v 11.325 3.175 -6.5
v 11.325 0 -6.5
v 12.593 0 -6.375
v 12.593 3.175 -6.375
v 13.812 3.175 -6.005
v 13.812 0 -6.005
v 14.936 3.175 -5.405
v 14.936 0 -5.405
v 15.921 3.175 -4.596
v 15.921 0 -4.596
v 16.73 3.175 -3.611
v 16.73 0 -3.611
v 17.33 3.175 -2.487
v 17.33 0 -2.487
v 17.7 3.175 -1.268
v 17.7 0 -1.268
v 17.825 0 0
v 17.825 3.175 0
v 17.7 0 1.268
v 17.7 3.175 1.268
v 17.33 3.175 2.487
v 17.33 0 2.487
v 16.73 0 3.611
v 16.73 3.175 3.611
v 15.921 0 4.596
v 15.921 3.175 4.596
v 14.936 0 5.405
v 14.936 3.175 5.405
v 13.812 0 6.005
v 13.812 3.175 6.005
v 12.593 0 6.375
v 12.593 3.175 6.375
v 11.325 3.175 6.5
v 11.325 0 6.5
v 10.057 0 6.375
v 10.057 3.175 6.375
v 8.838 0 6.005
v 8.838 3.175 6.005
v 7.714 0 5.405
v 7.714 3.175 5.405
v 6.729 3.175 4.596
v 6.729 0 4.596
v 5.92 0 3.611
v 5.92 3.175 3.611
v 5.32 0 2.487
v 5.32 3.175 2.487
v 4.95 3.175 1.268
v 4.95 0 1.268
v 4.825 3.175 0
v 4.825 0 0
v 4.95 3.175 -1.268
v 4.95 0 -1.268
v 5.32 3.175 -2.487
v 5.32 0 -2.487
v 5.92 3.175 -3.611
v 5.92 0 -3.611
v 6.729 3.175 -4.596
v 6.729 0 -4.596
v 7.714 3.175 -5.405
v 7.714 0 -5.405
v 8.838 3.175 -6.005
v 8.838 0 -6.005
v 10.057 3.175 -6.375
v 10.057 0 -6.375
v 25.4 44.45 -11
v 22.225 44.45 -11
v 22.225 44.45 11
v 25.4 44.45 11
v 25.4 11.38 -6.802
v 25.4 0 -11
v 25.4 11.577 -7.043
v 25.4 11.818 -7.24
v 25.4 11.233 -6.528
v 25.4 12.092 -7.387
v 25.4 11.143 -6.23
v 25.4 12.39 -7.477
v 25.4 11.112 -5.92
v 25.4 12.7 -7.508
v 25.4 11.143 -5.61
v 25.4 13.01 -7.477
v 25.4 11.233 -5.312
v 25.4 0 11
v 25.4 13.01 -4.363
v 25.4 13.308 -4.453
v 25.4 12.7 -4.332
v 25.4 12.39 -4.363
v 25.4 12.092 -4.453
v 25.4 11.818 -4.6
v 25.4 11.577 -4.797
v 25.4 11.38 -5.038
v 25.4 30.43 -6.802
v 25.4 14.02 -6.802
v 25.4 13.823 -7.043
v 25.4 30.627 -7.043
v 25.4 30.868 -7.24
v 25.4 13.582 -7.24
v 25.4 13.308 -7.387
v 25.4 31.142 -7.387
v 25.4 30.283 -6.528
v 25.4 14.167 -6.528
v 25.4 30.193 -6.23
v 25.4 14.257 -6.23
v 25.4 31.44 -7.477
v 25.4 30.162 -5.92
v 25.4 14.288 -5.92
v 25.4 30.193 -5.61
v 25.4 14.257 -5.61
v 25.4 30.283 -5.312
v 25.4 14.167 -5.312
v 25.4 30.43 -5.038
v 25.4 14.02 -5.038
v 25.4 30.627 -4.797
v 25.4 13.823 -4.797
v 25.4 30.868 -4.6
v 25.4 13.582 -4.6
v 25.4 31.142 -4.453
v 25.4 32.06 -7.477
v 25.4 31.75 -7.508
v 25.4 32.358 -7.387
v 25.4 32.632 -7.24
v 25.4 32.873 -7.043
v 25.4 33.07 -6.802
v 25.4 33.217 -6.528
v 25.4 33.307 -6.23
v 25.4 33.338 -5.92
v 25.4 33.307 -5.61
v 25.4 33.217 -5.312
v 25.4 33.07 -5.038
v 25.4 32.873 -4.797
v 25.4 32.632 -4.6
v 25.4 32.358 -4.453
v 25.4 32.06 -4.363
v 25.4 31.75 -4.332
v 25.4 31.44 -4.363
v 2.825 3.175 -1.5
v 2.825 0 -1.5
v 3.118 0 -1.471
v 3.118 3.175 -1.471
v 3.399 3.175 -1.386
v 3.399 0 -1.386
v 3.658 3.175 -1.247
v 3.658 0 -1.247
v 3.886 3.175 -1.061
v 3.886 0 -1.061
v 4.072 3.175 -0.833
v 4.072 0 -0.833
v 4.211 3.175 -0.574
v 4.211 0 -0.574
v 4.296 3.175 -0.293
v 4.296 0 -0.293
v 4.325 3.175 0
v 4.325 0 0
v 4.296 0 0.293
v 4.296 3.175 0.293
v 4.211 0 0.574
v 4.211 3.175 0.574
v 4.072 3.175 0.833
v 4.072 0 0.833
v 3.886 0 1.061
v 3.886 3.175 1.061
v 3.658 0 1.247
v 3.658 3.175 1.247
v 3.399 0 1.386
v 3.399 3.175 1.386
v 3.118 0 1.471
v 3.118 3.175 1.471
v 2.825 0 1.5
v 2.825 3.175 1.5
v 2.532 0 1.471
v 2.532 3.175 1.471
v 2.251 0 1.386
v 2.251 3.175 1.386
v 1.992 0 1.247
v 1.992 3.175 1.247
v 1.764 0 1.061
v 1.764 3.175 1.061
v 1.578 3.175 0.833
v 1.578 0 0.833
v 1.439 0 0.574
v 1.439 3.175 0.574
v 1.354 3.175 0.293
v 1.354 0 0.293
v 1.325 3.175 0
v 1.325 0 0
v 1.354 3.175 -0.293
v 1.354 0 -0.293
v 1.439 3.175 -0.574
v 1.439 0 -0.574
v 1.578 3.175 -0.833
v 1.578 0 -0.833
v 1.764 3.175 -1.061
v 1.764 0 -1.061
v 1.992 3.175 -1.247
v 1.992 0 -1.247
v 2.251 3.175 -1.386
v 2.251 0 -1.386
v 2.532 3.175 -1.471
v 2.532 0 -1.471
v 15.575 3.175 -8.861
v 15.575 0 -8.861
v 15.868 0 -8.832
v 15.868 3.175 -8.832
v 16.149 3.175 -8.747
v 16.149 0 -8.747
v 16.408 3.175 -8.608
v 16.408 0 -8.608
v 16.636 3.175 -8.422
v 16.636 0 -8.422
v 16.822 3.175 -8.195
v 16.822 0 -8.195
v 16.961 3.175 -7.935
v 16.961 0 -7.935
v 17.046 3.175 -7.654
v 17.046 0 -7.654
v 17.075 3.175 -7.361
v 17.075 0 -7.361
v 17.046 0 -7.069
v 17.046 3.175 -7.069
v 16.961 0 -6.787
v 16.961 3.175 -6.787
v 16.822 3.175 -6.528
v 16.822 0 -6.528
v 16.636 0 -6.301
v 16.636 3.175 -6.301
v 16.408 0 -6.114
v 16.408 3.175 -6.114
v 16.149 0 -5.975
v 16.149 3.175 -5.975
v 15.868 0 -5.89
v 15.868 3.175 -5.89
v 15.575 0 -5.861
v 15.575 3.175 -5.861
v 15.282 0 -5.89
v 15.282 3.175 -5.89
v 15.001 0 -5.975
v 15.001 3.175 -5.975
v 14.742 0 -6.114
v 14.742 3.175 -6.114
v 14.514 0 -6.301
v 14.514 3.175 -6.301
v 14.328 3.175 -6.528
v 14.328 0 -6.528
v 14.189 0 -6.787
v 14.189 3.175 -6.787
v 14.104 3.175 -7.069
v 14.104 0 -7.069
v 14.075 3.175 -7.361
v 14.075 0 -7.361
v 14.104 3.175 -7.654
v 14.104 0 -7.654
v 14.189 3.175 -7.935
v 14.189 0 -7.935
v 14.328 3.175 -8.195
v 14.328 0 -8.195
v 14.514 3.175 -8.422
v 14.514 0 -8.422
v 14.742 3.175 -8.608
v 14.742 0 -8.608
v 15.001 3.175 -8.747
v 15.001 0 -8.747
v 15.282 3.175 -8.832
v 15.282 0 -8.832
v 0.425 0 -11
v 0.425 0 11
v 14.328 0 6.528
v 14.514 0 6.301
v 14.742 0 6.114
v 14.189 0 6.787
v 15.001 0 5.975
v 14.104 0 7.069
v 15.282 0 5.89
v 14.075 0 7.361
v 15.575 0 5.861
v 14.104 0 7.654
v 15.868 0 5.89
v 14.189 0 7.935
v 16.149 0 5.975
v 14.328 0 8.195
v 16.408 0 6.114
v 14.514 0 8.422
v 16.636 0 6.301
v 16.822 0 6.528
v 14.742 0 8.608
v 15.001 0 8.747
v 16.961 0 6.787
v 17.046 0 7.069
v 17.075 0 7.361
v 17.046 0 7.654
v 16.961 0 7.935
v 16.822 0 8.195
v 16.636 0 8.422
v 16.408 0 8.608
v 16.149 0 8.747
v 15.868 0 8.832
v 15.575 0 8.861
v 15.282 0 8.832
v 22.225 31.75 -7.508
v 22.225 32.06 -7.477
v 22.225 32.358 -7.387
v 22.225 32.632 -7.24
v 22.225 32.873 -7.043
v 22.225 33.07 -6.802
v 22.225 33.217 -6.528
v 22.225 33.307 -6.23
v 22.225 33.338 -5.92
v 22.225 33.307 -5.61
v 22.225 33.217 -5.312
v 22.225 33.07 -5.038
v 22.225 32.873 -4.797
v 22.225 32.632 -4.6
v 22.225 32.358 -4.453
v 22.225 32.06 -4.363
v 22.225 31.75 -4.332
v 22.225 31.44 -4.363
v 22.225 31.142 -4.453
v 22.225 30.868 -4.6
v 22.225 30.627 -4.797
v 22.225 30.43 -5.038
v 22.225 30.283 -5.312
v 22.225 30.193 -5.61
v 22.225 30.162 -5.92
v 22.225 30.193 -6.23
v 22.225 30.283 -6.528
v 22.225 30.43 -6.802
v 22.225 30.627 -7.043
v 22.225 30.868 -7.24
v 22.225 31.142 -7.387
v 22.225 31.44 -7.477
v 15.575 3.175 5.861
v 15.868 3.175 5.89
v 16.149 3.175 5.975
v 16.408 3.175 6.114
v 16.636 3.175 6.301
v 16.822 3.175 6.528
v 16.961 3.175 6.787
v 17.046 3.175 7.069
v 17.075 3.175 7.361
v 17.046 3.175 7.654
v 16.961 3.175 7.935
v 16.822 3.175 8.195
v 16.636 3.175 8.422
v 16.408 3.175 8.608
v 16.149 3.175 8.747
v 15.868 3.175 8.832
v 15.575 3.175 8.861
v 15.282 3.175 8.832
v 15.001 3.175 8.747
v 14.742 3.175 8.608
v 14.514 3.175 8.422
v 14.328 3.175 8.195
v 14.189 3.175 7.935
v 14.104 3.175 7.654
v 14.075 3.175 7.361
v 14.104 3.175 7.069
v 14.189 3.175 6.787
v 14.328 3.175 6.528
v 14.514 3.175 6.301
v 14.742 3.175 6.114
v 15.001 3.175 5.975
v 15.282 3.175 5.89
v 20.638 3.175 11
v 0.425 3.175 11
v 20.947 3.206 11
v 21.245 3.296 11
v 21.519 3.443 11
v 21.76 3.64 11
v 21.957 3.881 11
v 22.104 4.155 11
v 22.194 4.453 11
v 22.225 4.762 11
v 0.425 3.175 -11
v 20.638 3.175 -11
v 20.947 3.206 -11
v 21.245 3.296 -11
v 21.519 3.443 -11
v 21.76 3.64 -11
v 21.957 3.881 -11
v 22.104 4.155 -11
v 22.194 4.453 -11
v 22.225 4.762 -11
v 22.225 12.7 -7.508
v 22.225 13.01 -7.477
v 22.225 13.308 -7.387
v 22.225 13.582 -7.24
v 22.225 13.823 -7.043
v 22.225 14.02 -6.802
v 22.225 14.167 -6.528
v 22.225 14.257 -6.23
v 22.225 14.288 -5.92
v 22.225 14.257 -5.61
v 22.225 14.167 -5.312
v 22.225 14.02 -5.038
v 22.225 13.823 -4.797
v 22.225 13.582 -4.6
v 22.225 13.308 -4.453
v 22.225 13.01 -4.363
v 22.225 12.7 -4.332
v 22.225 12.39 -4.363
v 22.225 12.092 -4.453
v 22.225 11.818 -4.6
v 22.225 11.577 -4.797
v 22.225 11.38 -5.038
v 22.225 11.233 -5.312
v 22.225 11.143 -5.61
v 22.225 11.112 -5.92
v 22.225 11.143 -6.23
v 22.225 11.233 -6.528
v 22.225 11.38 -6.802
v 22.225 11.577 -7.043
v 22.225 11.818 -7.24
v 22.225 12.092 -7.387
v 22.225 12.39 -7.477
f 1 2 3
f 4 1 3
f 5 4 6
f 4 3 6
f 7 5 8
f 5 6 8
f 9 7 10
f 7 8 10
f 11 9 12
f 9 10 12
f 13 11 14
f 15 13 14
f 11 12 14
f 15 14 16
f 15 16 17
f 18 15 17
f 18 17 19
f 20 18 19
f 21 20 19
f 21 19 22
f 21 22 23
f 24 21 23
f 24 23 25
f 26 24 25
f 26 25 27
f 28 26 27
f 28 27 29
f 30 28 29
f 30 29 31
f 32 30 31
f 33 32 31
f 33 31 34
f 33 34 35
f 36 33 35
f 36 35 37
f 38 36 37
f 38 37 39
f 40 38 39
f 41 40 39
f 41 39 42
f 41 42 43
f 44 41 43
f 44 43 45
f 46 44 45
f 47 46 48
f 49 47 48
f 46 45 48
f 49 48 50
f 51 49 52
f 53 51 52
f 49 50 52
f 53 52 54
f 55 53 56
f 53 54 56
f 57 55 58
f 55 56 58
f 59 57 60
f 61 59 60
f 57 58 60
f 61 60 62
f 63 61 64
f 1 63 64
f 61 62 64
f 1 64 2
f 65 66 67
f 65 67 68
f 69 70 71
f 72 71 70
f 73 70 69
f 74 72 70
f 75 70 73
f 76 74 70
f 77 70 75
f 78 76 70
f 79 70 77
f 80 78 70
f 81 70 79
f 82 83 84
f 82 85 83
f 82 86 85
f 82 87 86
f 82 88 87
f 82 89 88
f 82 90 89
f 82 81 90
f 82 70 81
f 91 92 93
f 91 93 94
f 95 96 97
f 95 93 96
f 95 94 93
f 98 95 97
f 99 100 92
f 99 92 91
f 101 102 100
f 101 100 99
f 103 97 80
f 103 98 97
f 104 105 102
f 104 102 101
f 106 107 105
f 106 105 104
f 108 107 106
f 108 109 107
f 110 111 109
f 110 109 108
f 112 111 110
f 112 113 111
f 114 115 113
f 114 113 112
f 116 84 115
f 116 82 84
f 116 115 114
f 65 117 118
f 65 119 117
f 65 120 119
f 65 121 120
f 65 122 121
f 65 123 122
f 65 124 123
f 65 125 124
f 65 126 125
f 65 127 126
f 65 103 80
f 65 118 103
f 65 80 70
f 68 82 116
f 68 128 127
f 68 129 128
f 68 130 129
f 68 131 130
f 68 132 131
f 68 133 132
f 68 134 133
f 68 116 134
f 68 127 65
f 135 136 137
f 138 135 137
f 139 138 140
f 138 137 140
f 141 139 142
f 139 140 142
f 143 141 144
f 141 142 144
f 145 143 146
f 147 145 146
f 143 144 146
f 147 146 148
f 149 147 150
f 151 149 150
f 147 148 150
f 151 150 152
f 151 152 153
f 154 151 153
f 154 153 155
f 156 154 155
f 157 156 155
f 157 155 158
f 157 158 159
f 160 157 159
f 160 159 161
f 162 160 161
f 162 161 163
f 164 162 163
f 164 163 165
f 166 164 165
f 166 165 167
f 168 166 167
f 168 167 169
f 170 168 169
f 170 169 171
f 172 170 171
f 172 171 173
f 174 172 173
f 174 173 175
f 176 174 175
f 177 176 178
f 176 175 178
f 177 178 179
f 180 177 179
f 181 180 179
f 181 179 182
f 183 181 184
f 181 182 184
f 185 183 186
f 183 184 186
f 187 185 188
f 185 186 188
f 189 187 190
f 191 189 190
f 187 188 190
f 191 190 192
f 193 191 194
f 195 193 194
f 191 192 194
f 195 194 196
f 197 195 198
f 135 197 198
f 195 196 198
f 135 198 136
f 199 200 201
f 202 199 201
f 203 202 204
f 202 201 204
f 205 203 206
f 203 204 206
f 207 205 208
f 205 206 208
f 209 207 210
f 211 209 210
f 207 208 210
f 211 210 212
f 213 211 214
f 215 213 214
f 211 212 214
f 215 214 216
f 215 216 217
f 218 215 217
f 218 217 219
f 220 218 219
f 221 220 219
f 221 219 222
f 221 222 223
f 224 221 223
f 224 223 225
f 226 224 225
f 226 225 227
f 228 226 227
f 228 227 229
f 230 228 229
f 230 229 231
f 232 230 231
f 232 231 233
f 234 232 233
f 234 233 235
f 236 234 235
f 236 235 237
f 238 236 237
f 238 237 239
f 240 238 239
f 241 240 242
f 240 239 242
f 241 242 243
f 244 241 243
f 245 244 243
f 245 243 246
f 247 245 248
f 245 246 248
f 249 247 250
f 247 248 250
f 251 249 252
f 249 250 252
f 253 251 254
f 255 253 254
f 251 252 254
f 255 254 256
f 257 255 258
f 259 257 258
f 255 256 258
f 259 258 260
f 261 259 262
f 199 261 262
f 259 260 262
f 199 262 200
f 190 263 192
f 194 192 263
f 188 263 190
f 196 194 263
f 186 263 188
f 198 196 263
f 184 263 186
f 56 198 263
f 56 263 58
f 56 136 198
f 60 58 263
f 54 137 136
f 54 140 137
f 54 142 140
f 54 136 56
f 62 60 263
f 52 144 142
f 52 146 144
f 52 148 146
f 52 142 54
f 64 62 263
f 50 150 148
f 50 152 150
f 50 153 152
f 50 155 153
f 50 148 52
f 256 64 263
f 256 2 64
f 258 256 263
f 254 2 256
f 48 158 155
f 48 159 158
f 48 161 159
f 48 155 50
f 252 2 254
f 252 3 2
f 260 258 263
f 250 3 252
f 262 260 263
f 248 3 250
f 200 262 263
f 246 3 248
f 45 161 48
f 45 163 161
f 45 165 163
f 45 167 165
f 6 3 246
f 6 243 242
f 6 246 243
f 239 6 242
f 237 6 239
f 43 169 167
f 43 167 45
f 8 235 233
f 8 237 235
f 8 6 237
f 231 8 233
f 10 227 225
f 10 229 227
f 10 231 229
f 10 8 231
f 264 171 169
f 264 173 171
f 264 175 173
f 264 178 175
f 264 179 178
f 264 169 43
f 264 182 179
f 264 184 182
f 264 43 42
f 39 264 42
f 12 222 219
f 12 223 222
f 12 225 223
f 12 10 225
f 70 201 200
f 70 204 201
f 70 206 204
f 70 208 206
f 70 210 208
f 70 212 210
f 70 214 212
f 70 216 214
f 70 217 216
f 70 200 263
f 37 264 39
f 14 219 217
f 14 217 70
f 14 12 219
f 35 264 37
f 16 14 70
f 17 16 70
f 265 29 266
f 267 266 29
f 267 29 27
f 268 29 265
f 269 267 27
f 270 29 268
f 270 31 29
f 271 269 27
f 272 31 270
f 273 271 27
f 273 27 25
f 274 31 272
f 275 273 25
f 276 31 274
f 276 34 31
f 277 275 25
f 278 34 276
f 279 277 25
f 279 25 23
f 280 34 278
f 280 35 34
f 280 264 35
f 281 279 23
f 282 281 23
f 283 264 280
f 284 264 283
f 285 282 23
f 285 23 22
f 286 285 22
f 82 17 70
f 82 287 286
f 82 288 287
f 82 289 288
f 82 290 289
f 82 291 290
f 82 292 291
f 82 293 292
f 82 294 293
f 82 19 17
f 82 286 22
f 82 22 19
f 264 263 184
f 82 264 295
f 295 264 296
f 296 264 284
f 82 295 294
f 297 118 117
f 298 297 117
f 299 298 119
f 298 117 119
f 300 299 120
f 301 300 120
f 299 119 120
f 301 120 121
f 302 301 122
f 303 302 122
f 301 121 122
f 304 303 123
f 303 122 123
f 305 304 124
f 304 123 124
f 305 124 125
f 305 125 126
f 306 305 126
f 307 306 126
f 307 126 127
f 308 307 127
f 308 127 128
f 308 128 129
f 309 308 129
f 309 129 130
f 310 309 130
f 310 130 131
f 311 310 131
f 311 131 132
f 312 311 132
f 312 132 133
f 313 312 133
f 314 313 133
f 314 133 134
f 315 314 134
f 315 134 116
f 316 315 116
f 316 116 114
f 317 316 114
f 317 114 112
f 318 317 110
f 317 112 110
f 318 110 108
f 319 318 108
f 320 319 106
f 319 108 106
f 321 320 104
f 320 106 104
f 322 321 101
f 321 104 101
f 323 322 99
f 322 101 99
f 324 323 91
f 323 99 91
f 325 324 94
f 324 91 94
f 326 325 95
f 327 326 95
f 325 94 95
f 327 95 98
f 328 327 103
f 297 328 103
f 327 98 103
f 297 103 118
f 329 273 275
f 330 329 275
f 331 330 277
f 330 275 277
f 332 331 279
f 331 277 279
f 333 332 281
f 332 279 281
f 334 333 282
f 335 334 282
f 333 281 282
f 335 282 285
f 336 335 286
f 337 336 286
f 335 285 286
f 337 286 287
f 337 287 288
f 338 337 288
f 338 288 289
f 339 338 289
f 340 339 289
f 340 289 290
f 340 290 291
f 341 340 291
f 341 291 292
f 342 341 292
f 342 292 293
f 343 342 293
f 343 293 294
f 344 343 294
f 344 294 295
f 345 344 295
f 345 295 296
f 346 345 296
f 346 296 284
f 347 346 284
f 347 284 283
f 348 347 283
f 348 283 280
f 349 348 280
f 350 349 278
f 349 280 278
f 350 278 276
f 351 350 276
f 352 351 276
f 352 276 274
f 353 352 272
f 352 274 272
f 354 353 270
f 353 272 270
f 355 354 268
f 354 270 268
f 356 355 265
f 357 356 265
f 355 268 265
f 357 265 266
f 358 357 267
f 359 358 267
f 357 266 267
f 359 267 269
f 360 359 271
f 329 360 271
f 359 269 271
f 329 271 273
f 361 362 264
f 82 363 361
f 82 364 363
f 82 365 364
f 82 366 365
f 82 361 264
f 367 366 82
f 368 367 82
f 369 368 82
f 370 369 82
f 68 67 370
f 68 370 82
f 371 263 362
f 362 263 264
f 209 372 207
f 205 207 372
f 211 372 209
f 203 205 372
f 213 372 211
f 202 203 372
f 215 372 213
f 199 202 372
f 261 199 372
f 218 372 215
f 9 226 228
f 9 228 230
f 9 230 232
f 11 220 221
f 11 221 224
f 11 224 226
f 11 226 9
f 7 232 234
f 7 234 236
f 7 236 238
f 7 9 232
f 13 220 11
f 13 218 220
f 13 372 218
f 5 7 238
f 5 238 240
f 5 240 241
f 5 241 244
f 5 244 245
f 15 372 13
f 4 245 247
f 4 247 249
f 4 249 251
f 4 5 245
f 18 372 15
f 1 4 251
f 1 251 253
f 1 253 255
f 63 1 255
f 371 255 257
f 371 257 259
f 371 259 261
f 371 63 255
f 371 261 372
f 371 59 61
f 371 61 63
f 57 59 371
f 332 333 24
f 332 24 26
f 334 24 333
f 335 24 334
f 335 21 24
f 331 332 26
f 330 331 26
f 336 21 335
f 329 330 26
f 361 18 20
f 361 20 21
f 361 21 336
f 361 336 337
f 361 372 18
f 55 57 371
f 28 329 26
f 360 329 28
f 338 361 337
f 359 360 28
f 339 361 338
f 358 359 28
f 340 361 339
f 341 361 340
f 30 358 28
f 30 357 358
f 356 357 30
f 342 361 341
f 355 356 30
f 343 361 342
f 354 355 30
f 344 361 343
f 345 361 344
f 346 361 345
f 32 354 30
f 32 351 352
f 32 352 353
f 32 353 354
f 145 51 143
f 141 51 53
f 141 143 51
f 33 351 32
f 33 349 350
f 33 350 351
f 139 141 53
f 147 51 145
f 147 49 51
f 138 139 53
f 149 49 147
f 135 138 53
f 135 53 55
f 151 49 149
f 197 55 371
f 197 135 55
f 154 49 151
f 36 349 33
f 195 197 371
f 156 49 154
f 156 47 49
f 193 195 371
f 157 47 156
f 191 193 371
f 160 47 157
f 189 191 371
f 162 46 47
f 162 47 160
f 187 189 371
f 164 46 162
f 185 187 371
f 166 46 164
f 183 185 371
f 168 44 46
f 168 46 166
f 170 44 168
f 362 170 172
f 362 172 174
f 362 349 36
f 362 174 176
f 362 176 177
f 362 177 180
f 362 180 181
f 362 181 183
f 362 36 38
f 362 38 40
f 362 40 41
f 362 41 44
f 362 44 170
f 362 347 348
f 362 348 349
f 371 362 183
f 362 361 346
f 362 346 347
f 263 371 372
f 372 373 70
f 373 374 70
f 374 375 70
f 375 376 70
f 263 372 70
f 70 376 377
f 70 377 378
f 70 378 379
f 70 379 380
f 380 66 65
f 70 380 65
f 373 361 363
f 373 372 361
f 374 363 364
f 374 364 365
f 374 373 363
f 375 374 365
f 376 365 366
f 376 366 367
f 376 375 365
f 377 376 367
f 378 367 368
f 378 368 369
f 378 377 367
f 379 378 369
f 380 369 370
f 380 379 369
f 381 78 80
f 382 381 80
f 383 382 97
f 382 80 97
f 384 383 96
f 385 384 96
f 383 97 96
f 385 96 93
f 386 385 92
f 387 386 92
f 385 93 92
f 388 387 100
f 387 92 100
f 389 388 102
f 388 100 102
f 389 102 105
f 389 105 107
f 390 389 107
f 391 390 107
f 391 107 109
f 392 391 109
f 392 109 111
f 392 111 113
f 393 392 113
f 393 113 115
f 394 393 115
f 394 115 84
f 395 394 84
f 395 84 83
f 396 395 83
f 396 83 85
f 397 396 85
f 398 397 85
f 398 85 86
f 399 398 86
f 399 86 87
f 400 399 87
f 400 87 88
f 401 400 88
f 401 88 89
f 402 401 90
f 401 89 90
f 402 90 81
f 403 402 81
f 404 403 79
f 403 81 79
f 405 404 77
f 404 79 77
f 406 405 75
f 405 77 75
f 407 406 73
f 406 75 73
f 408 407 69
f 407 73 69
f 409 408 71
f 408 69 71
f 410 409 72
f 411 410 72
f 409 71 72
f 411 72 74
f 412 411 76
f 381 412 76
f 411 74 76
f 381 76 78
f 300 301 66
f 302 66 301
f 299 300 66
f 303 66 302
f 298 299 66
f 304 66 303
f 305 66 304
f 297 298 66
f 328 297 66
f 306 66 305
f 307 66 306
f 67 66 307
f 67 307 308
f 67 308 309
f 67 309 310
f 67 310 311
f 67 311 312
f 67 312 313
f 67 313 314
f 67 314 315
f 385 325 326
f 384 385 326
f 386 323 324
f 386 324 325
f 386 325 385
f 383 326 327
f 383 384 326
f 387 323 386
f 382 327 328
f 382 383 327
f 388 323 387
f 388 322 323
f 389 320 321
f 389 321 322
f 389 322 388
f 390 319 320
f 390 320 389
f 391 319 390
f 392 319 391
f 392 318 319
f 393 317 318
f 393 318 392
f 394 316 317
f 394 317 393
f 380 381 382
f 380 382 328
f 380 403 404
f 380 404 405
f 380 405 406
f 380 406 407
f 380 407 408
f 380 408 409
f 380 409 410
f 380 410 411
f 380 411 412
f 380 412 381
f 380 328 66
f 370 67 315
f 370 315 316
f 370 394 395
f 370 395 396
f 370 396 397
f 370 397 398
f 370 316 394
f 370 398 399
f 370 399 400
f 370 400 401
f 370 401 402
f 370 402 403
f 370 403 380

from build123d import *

# Parameters (mm, degrees)
BOSS_EXTRUDE1_DEPTH = 11
FILLET1_R           = 1.5875
SKETCH3_W           = 24.423912887
SKETCH3_H           = 26.552361768
CUT_EXTRUDE1_DEPTH  = 61.908127536
SKETCH4_R           = 1.5
SKETCH4_R_2         = 6.5
SKETCH4_W           = 25.825
SKETCH4_H           = 22
CUT_EXTRUDE2_DEPTH  = 53.363751775
SKETCH5_R           = 1.5875
CUT_EXTRUDE3_DEPTH  = 53.158921816


with BuildPart() as part:
    # Sketch2 → Boss-Extrude1 (new, symmetric)
    with BuildSketch(Plane.XY):
        Polygon((-25.4, 0), (25.4, 0), (25.4, 50.8), (22.225, 50.8), (22.225, 3.175), (-25.4, 3.175), align=None)
    extrude(amount=BOSS_EXTRUDE1_DEPTH, both=True)

    # Fillet1
    fillet1_edges = [part.edges().sort_by_distance(p)[0] for p in [
        (22.225, 3.175, 0),
    ]]
    fillet(fillet1_edges, radius=FILLET1_R)

    # Sketch3 → Cut-Extrude1 (cut, through all)
    with BuildSketch(Plane.XY.offset(11)):
        with Locations((18.271034128, 57.726180884)):
            Rectangle(SKETCH3_W, SKETCH3_H)
    extrude(amount=-CUT_EXTRUDE1_DEPTH, mode=Mode.SUBTRACT)

    # Sketch4 → Cut-Extrude2 (cut, through all)
    with BuildSketch(Plane.XZ):
        with Locations(Location((15.575, -7.361215932, 0), (0, 0, 270))):
            Circle(SKETCH4_R)
        with Locations(Location((11.325, 0, 0), (0, 0, 270))):
            Circle(SKETCH4_R_2)
        with Locations(Location((15.575, 7.361215932, 0), (0, 0, 270))):
            Circle(SKETCH4_R)
        with Locations((-12.4875, 0)):
            Rectangle(SKETCH4_W, SKETCH4_H)
        with Locations(Location((2.825, 0, 0), (0, 0, 270))):
            Circle(SKETCH4_R)
    extrude(amount=-CUT_EXTRUDE2_DEPTH, mode=Mode.SUBTRACT)

    # Sketch5 → Cut-Extrude3 (cut, through all)
    with BuildSketch(Plane(origin=(25.4, 0, 0), x_dir=(0, 0, -1), z_dir=(1, 0, 0))):
        with Locations((5.92, 31.75)):
            Circle(SKETCH5_R)
        with Locations((5.92, 12.7)):
            Circle(SKETCH5_R)
    extrude(amount=-CUT_EXTRUDE3_DEPTH, mode=Mode.SUBTRACT)


solid = part.part
